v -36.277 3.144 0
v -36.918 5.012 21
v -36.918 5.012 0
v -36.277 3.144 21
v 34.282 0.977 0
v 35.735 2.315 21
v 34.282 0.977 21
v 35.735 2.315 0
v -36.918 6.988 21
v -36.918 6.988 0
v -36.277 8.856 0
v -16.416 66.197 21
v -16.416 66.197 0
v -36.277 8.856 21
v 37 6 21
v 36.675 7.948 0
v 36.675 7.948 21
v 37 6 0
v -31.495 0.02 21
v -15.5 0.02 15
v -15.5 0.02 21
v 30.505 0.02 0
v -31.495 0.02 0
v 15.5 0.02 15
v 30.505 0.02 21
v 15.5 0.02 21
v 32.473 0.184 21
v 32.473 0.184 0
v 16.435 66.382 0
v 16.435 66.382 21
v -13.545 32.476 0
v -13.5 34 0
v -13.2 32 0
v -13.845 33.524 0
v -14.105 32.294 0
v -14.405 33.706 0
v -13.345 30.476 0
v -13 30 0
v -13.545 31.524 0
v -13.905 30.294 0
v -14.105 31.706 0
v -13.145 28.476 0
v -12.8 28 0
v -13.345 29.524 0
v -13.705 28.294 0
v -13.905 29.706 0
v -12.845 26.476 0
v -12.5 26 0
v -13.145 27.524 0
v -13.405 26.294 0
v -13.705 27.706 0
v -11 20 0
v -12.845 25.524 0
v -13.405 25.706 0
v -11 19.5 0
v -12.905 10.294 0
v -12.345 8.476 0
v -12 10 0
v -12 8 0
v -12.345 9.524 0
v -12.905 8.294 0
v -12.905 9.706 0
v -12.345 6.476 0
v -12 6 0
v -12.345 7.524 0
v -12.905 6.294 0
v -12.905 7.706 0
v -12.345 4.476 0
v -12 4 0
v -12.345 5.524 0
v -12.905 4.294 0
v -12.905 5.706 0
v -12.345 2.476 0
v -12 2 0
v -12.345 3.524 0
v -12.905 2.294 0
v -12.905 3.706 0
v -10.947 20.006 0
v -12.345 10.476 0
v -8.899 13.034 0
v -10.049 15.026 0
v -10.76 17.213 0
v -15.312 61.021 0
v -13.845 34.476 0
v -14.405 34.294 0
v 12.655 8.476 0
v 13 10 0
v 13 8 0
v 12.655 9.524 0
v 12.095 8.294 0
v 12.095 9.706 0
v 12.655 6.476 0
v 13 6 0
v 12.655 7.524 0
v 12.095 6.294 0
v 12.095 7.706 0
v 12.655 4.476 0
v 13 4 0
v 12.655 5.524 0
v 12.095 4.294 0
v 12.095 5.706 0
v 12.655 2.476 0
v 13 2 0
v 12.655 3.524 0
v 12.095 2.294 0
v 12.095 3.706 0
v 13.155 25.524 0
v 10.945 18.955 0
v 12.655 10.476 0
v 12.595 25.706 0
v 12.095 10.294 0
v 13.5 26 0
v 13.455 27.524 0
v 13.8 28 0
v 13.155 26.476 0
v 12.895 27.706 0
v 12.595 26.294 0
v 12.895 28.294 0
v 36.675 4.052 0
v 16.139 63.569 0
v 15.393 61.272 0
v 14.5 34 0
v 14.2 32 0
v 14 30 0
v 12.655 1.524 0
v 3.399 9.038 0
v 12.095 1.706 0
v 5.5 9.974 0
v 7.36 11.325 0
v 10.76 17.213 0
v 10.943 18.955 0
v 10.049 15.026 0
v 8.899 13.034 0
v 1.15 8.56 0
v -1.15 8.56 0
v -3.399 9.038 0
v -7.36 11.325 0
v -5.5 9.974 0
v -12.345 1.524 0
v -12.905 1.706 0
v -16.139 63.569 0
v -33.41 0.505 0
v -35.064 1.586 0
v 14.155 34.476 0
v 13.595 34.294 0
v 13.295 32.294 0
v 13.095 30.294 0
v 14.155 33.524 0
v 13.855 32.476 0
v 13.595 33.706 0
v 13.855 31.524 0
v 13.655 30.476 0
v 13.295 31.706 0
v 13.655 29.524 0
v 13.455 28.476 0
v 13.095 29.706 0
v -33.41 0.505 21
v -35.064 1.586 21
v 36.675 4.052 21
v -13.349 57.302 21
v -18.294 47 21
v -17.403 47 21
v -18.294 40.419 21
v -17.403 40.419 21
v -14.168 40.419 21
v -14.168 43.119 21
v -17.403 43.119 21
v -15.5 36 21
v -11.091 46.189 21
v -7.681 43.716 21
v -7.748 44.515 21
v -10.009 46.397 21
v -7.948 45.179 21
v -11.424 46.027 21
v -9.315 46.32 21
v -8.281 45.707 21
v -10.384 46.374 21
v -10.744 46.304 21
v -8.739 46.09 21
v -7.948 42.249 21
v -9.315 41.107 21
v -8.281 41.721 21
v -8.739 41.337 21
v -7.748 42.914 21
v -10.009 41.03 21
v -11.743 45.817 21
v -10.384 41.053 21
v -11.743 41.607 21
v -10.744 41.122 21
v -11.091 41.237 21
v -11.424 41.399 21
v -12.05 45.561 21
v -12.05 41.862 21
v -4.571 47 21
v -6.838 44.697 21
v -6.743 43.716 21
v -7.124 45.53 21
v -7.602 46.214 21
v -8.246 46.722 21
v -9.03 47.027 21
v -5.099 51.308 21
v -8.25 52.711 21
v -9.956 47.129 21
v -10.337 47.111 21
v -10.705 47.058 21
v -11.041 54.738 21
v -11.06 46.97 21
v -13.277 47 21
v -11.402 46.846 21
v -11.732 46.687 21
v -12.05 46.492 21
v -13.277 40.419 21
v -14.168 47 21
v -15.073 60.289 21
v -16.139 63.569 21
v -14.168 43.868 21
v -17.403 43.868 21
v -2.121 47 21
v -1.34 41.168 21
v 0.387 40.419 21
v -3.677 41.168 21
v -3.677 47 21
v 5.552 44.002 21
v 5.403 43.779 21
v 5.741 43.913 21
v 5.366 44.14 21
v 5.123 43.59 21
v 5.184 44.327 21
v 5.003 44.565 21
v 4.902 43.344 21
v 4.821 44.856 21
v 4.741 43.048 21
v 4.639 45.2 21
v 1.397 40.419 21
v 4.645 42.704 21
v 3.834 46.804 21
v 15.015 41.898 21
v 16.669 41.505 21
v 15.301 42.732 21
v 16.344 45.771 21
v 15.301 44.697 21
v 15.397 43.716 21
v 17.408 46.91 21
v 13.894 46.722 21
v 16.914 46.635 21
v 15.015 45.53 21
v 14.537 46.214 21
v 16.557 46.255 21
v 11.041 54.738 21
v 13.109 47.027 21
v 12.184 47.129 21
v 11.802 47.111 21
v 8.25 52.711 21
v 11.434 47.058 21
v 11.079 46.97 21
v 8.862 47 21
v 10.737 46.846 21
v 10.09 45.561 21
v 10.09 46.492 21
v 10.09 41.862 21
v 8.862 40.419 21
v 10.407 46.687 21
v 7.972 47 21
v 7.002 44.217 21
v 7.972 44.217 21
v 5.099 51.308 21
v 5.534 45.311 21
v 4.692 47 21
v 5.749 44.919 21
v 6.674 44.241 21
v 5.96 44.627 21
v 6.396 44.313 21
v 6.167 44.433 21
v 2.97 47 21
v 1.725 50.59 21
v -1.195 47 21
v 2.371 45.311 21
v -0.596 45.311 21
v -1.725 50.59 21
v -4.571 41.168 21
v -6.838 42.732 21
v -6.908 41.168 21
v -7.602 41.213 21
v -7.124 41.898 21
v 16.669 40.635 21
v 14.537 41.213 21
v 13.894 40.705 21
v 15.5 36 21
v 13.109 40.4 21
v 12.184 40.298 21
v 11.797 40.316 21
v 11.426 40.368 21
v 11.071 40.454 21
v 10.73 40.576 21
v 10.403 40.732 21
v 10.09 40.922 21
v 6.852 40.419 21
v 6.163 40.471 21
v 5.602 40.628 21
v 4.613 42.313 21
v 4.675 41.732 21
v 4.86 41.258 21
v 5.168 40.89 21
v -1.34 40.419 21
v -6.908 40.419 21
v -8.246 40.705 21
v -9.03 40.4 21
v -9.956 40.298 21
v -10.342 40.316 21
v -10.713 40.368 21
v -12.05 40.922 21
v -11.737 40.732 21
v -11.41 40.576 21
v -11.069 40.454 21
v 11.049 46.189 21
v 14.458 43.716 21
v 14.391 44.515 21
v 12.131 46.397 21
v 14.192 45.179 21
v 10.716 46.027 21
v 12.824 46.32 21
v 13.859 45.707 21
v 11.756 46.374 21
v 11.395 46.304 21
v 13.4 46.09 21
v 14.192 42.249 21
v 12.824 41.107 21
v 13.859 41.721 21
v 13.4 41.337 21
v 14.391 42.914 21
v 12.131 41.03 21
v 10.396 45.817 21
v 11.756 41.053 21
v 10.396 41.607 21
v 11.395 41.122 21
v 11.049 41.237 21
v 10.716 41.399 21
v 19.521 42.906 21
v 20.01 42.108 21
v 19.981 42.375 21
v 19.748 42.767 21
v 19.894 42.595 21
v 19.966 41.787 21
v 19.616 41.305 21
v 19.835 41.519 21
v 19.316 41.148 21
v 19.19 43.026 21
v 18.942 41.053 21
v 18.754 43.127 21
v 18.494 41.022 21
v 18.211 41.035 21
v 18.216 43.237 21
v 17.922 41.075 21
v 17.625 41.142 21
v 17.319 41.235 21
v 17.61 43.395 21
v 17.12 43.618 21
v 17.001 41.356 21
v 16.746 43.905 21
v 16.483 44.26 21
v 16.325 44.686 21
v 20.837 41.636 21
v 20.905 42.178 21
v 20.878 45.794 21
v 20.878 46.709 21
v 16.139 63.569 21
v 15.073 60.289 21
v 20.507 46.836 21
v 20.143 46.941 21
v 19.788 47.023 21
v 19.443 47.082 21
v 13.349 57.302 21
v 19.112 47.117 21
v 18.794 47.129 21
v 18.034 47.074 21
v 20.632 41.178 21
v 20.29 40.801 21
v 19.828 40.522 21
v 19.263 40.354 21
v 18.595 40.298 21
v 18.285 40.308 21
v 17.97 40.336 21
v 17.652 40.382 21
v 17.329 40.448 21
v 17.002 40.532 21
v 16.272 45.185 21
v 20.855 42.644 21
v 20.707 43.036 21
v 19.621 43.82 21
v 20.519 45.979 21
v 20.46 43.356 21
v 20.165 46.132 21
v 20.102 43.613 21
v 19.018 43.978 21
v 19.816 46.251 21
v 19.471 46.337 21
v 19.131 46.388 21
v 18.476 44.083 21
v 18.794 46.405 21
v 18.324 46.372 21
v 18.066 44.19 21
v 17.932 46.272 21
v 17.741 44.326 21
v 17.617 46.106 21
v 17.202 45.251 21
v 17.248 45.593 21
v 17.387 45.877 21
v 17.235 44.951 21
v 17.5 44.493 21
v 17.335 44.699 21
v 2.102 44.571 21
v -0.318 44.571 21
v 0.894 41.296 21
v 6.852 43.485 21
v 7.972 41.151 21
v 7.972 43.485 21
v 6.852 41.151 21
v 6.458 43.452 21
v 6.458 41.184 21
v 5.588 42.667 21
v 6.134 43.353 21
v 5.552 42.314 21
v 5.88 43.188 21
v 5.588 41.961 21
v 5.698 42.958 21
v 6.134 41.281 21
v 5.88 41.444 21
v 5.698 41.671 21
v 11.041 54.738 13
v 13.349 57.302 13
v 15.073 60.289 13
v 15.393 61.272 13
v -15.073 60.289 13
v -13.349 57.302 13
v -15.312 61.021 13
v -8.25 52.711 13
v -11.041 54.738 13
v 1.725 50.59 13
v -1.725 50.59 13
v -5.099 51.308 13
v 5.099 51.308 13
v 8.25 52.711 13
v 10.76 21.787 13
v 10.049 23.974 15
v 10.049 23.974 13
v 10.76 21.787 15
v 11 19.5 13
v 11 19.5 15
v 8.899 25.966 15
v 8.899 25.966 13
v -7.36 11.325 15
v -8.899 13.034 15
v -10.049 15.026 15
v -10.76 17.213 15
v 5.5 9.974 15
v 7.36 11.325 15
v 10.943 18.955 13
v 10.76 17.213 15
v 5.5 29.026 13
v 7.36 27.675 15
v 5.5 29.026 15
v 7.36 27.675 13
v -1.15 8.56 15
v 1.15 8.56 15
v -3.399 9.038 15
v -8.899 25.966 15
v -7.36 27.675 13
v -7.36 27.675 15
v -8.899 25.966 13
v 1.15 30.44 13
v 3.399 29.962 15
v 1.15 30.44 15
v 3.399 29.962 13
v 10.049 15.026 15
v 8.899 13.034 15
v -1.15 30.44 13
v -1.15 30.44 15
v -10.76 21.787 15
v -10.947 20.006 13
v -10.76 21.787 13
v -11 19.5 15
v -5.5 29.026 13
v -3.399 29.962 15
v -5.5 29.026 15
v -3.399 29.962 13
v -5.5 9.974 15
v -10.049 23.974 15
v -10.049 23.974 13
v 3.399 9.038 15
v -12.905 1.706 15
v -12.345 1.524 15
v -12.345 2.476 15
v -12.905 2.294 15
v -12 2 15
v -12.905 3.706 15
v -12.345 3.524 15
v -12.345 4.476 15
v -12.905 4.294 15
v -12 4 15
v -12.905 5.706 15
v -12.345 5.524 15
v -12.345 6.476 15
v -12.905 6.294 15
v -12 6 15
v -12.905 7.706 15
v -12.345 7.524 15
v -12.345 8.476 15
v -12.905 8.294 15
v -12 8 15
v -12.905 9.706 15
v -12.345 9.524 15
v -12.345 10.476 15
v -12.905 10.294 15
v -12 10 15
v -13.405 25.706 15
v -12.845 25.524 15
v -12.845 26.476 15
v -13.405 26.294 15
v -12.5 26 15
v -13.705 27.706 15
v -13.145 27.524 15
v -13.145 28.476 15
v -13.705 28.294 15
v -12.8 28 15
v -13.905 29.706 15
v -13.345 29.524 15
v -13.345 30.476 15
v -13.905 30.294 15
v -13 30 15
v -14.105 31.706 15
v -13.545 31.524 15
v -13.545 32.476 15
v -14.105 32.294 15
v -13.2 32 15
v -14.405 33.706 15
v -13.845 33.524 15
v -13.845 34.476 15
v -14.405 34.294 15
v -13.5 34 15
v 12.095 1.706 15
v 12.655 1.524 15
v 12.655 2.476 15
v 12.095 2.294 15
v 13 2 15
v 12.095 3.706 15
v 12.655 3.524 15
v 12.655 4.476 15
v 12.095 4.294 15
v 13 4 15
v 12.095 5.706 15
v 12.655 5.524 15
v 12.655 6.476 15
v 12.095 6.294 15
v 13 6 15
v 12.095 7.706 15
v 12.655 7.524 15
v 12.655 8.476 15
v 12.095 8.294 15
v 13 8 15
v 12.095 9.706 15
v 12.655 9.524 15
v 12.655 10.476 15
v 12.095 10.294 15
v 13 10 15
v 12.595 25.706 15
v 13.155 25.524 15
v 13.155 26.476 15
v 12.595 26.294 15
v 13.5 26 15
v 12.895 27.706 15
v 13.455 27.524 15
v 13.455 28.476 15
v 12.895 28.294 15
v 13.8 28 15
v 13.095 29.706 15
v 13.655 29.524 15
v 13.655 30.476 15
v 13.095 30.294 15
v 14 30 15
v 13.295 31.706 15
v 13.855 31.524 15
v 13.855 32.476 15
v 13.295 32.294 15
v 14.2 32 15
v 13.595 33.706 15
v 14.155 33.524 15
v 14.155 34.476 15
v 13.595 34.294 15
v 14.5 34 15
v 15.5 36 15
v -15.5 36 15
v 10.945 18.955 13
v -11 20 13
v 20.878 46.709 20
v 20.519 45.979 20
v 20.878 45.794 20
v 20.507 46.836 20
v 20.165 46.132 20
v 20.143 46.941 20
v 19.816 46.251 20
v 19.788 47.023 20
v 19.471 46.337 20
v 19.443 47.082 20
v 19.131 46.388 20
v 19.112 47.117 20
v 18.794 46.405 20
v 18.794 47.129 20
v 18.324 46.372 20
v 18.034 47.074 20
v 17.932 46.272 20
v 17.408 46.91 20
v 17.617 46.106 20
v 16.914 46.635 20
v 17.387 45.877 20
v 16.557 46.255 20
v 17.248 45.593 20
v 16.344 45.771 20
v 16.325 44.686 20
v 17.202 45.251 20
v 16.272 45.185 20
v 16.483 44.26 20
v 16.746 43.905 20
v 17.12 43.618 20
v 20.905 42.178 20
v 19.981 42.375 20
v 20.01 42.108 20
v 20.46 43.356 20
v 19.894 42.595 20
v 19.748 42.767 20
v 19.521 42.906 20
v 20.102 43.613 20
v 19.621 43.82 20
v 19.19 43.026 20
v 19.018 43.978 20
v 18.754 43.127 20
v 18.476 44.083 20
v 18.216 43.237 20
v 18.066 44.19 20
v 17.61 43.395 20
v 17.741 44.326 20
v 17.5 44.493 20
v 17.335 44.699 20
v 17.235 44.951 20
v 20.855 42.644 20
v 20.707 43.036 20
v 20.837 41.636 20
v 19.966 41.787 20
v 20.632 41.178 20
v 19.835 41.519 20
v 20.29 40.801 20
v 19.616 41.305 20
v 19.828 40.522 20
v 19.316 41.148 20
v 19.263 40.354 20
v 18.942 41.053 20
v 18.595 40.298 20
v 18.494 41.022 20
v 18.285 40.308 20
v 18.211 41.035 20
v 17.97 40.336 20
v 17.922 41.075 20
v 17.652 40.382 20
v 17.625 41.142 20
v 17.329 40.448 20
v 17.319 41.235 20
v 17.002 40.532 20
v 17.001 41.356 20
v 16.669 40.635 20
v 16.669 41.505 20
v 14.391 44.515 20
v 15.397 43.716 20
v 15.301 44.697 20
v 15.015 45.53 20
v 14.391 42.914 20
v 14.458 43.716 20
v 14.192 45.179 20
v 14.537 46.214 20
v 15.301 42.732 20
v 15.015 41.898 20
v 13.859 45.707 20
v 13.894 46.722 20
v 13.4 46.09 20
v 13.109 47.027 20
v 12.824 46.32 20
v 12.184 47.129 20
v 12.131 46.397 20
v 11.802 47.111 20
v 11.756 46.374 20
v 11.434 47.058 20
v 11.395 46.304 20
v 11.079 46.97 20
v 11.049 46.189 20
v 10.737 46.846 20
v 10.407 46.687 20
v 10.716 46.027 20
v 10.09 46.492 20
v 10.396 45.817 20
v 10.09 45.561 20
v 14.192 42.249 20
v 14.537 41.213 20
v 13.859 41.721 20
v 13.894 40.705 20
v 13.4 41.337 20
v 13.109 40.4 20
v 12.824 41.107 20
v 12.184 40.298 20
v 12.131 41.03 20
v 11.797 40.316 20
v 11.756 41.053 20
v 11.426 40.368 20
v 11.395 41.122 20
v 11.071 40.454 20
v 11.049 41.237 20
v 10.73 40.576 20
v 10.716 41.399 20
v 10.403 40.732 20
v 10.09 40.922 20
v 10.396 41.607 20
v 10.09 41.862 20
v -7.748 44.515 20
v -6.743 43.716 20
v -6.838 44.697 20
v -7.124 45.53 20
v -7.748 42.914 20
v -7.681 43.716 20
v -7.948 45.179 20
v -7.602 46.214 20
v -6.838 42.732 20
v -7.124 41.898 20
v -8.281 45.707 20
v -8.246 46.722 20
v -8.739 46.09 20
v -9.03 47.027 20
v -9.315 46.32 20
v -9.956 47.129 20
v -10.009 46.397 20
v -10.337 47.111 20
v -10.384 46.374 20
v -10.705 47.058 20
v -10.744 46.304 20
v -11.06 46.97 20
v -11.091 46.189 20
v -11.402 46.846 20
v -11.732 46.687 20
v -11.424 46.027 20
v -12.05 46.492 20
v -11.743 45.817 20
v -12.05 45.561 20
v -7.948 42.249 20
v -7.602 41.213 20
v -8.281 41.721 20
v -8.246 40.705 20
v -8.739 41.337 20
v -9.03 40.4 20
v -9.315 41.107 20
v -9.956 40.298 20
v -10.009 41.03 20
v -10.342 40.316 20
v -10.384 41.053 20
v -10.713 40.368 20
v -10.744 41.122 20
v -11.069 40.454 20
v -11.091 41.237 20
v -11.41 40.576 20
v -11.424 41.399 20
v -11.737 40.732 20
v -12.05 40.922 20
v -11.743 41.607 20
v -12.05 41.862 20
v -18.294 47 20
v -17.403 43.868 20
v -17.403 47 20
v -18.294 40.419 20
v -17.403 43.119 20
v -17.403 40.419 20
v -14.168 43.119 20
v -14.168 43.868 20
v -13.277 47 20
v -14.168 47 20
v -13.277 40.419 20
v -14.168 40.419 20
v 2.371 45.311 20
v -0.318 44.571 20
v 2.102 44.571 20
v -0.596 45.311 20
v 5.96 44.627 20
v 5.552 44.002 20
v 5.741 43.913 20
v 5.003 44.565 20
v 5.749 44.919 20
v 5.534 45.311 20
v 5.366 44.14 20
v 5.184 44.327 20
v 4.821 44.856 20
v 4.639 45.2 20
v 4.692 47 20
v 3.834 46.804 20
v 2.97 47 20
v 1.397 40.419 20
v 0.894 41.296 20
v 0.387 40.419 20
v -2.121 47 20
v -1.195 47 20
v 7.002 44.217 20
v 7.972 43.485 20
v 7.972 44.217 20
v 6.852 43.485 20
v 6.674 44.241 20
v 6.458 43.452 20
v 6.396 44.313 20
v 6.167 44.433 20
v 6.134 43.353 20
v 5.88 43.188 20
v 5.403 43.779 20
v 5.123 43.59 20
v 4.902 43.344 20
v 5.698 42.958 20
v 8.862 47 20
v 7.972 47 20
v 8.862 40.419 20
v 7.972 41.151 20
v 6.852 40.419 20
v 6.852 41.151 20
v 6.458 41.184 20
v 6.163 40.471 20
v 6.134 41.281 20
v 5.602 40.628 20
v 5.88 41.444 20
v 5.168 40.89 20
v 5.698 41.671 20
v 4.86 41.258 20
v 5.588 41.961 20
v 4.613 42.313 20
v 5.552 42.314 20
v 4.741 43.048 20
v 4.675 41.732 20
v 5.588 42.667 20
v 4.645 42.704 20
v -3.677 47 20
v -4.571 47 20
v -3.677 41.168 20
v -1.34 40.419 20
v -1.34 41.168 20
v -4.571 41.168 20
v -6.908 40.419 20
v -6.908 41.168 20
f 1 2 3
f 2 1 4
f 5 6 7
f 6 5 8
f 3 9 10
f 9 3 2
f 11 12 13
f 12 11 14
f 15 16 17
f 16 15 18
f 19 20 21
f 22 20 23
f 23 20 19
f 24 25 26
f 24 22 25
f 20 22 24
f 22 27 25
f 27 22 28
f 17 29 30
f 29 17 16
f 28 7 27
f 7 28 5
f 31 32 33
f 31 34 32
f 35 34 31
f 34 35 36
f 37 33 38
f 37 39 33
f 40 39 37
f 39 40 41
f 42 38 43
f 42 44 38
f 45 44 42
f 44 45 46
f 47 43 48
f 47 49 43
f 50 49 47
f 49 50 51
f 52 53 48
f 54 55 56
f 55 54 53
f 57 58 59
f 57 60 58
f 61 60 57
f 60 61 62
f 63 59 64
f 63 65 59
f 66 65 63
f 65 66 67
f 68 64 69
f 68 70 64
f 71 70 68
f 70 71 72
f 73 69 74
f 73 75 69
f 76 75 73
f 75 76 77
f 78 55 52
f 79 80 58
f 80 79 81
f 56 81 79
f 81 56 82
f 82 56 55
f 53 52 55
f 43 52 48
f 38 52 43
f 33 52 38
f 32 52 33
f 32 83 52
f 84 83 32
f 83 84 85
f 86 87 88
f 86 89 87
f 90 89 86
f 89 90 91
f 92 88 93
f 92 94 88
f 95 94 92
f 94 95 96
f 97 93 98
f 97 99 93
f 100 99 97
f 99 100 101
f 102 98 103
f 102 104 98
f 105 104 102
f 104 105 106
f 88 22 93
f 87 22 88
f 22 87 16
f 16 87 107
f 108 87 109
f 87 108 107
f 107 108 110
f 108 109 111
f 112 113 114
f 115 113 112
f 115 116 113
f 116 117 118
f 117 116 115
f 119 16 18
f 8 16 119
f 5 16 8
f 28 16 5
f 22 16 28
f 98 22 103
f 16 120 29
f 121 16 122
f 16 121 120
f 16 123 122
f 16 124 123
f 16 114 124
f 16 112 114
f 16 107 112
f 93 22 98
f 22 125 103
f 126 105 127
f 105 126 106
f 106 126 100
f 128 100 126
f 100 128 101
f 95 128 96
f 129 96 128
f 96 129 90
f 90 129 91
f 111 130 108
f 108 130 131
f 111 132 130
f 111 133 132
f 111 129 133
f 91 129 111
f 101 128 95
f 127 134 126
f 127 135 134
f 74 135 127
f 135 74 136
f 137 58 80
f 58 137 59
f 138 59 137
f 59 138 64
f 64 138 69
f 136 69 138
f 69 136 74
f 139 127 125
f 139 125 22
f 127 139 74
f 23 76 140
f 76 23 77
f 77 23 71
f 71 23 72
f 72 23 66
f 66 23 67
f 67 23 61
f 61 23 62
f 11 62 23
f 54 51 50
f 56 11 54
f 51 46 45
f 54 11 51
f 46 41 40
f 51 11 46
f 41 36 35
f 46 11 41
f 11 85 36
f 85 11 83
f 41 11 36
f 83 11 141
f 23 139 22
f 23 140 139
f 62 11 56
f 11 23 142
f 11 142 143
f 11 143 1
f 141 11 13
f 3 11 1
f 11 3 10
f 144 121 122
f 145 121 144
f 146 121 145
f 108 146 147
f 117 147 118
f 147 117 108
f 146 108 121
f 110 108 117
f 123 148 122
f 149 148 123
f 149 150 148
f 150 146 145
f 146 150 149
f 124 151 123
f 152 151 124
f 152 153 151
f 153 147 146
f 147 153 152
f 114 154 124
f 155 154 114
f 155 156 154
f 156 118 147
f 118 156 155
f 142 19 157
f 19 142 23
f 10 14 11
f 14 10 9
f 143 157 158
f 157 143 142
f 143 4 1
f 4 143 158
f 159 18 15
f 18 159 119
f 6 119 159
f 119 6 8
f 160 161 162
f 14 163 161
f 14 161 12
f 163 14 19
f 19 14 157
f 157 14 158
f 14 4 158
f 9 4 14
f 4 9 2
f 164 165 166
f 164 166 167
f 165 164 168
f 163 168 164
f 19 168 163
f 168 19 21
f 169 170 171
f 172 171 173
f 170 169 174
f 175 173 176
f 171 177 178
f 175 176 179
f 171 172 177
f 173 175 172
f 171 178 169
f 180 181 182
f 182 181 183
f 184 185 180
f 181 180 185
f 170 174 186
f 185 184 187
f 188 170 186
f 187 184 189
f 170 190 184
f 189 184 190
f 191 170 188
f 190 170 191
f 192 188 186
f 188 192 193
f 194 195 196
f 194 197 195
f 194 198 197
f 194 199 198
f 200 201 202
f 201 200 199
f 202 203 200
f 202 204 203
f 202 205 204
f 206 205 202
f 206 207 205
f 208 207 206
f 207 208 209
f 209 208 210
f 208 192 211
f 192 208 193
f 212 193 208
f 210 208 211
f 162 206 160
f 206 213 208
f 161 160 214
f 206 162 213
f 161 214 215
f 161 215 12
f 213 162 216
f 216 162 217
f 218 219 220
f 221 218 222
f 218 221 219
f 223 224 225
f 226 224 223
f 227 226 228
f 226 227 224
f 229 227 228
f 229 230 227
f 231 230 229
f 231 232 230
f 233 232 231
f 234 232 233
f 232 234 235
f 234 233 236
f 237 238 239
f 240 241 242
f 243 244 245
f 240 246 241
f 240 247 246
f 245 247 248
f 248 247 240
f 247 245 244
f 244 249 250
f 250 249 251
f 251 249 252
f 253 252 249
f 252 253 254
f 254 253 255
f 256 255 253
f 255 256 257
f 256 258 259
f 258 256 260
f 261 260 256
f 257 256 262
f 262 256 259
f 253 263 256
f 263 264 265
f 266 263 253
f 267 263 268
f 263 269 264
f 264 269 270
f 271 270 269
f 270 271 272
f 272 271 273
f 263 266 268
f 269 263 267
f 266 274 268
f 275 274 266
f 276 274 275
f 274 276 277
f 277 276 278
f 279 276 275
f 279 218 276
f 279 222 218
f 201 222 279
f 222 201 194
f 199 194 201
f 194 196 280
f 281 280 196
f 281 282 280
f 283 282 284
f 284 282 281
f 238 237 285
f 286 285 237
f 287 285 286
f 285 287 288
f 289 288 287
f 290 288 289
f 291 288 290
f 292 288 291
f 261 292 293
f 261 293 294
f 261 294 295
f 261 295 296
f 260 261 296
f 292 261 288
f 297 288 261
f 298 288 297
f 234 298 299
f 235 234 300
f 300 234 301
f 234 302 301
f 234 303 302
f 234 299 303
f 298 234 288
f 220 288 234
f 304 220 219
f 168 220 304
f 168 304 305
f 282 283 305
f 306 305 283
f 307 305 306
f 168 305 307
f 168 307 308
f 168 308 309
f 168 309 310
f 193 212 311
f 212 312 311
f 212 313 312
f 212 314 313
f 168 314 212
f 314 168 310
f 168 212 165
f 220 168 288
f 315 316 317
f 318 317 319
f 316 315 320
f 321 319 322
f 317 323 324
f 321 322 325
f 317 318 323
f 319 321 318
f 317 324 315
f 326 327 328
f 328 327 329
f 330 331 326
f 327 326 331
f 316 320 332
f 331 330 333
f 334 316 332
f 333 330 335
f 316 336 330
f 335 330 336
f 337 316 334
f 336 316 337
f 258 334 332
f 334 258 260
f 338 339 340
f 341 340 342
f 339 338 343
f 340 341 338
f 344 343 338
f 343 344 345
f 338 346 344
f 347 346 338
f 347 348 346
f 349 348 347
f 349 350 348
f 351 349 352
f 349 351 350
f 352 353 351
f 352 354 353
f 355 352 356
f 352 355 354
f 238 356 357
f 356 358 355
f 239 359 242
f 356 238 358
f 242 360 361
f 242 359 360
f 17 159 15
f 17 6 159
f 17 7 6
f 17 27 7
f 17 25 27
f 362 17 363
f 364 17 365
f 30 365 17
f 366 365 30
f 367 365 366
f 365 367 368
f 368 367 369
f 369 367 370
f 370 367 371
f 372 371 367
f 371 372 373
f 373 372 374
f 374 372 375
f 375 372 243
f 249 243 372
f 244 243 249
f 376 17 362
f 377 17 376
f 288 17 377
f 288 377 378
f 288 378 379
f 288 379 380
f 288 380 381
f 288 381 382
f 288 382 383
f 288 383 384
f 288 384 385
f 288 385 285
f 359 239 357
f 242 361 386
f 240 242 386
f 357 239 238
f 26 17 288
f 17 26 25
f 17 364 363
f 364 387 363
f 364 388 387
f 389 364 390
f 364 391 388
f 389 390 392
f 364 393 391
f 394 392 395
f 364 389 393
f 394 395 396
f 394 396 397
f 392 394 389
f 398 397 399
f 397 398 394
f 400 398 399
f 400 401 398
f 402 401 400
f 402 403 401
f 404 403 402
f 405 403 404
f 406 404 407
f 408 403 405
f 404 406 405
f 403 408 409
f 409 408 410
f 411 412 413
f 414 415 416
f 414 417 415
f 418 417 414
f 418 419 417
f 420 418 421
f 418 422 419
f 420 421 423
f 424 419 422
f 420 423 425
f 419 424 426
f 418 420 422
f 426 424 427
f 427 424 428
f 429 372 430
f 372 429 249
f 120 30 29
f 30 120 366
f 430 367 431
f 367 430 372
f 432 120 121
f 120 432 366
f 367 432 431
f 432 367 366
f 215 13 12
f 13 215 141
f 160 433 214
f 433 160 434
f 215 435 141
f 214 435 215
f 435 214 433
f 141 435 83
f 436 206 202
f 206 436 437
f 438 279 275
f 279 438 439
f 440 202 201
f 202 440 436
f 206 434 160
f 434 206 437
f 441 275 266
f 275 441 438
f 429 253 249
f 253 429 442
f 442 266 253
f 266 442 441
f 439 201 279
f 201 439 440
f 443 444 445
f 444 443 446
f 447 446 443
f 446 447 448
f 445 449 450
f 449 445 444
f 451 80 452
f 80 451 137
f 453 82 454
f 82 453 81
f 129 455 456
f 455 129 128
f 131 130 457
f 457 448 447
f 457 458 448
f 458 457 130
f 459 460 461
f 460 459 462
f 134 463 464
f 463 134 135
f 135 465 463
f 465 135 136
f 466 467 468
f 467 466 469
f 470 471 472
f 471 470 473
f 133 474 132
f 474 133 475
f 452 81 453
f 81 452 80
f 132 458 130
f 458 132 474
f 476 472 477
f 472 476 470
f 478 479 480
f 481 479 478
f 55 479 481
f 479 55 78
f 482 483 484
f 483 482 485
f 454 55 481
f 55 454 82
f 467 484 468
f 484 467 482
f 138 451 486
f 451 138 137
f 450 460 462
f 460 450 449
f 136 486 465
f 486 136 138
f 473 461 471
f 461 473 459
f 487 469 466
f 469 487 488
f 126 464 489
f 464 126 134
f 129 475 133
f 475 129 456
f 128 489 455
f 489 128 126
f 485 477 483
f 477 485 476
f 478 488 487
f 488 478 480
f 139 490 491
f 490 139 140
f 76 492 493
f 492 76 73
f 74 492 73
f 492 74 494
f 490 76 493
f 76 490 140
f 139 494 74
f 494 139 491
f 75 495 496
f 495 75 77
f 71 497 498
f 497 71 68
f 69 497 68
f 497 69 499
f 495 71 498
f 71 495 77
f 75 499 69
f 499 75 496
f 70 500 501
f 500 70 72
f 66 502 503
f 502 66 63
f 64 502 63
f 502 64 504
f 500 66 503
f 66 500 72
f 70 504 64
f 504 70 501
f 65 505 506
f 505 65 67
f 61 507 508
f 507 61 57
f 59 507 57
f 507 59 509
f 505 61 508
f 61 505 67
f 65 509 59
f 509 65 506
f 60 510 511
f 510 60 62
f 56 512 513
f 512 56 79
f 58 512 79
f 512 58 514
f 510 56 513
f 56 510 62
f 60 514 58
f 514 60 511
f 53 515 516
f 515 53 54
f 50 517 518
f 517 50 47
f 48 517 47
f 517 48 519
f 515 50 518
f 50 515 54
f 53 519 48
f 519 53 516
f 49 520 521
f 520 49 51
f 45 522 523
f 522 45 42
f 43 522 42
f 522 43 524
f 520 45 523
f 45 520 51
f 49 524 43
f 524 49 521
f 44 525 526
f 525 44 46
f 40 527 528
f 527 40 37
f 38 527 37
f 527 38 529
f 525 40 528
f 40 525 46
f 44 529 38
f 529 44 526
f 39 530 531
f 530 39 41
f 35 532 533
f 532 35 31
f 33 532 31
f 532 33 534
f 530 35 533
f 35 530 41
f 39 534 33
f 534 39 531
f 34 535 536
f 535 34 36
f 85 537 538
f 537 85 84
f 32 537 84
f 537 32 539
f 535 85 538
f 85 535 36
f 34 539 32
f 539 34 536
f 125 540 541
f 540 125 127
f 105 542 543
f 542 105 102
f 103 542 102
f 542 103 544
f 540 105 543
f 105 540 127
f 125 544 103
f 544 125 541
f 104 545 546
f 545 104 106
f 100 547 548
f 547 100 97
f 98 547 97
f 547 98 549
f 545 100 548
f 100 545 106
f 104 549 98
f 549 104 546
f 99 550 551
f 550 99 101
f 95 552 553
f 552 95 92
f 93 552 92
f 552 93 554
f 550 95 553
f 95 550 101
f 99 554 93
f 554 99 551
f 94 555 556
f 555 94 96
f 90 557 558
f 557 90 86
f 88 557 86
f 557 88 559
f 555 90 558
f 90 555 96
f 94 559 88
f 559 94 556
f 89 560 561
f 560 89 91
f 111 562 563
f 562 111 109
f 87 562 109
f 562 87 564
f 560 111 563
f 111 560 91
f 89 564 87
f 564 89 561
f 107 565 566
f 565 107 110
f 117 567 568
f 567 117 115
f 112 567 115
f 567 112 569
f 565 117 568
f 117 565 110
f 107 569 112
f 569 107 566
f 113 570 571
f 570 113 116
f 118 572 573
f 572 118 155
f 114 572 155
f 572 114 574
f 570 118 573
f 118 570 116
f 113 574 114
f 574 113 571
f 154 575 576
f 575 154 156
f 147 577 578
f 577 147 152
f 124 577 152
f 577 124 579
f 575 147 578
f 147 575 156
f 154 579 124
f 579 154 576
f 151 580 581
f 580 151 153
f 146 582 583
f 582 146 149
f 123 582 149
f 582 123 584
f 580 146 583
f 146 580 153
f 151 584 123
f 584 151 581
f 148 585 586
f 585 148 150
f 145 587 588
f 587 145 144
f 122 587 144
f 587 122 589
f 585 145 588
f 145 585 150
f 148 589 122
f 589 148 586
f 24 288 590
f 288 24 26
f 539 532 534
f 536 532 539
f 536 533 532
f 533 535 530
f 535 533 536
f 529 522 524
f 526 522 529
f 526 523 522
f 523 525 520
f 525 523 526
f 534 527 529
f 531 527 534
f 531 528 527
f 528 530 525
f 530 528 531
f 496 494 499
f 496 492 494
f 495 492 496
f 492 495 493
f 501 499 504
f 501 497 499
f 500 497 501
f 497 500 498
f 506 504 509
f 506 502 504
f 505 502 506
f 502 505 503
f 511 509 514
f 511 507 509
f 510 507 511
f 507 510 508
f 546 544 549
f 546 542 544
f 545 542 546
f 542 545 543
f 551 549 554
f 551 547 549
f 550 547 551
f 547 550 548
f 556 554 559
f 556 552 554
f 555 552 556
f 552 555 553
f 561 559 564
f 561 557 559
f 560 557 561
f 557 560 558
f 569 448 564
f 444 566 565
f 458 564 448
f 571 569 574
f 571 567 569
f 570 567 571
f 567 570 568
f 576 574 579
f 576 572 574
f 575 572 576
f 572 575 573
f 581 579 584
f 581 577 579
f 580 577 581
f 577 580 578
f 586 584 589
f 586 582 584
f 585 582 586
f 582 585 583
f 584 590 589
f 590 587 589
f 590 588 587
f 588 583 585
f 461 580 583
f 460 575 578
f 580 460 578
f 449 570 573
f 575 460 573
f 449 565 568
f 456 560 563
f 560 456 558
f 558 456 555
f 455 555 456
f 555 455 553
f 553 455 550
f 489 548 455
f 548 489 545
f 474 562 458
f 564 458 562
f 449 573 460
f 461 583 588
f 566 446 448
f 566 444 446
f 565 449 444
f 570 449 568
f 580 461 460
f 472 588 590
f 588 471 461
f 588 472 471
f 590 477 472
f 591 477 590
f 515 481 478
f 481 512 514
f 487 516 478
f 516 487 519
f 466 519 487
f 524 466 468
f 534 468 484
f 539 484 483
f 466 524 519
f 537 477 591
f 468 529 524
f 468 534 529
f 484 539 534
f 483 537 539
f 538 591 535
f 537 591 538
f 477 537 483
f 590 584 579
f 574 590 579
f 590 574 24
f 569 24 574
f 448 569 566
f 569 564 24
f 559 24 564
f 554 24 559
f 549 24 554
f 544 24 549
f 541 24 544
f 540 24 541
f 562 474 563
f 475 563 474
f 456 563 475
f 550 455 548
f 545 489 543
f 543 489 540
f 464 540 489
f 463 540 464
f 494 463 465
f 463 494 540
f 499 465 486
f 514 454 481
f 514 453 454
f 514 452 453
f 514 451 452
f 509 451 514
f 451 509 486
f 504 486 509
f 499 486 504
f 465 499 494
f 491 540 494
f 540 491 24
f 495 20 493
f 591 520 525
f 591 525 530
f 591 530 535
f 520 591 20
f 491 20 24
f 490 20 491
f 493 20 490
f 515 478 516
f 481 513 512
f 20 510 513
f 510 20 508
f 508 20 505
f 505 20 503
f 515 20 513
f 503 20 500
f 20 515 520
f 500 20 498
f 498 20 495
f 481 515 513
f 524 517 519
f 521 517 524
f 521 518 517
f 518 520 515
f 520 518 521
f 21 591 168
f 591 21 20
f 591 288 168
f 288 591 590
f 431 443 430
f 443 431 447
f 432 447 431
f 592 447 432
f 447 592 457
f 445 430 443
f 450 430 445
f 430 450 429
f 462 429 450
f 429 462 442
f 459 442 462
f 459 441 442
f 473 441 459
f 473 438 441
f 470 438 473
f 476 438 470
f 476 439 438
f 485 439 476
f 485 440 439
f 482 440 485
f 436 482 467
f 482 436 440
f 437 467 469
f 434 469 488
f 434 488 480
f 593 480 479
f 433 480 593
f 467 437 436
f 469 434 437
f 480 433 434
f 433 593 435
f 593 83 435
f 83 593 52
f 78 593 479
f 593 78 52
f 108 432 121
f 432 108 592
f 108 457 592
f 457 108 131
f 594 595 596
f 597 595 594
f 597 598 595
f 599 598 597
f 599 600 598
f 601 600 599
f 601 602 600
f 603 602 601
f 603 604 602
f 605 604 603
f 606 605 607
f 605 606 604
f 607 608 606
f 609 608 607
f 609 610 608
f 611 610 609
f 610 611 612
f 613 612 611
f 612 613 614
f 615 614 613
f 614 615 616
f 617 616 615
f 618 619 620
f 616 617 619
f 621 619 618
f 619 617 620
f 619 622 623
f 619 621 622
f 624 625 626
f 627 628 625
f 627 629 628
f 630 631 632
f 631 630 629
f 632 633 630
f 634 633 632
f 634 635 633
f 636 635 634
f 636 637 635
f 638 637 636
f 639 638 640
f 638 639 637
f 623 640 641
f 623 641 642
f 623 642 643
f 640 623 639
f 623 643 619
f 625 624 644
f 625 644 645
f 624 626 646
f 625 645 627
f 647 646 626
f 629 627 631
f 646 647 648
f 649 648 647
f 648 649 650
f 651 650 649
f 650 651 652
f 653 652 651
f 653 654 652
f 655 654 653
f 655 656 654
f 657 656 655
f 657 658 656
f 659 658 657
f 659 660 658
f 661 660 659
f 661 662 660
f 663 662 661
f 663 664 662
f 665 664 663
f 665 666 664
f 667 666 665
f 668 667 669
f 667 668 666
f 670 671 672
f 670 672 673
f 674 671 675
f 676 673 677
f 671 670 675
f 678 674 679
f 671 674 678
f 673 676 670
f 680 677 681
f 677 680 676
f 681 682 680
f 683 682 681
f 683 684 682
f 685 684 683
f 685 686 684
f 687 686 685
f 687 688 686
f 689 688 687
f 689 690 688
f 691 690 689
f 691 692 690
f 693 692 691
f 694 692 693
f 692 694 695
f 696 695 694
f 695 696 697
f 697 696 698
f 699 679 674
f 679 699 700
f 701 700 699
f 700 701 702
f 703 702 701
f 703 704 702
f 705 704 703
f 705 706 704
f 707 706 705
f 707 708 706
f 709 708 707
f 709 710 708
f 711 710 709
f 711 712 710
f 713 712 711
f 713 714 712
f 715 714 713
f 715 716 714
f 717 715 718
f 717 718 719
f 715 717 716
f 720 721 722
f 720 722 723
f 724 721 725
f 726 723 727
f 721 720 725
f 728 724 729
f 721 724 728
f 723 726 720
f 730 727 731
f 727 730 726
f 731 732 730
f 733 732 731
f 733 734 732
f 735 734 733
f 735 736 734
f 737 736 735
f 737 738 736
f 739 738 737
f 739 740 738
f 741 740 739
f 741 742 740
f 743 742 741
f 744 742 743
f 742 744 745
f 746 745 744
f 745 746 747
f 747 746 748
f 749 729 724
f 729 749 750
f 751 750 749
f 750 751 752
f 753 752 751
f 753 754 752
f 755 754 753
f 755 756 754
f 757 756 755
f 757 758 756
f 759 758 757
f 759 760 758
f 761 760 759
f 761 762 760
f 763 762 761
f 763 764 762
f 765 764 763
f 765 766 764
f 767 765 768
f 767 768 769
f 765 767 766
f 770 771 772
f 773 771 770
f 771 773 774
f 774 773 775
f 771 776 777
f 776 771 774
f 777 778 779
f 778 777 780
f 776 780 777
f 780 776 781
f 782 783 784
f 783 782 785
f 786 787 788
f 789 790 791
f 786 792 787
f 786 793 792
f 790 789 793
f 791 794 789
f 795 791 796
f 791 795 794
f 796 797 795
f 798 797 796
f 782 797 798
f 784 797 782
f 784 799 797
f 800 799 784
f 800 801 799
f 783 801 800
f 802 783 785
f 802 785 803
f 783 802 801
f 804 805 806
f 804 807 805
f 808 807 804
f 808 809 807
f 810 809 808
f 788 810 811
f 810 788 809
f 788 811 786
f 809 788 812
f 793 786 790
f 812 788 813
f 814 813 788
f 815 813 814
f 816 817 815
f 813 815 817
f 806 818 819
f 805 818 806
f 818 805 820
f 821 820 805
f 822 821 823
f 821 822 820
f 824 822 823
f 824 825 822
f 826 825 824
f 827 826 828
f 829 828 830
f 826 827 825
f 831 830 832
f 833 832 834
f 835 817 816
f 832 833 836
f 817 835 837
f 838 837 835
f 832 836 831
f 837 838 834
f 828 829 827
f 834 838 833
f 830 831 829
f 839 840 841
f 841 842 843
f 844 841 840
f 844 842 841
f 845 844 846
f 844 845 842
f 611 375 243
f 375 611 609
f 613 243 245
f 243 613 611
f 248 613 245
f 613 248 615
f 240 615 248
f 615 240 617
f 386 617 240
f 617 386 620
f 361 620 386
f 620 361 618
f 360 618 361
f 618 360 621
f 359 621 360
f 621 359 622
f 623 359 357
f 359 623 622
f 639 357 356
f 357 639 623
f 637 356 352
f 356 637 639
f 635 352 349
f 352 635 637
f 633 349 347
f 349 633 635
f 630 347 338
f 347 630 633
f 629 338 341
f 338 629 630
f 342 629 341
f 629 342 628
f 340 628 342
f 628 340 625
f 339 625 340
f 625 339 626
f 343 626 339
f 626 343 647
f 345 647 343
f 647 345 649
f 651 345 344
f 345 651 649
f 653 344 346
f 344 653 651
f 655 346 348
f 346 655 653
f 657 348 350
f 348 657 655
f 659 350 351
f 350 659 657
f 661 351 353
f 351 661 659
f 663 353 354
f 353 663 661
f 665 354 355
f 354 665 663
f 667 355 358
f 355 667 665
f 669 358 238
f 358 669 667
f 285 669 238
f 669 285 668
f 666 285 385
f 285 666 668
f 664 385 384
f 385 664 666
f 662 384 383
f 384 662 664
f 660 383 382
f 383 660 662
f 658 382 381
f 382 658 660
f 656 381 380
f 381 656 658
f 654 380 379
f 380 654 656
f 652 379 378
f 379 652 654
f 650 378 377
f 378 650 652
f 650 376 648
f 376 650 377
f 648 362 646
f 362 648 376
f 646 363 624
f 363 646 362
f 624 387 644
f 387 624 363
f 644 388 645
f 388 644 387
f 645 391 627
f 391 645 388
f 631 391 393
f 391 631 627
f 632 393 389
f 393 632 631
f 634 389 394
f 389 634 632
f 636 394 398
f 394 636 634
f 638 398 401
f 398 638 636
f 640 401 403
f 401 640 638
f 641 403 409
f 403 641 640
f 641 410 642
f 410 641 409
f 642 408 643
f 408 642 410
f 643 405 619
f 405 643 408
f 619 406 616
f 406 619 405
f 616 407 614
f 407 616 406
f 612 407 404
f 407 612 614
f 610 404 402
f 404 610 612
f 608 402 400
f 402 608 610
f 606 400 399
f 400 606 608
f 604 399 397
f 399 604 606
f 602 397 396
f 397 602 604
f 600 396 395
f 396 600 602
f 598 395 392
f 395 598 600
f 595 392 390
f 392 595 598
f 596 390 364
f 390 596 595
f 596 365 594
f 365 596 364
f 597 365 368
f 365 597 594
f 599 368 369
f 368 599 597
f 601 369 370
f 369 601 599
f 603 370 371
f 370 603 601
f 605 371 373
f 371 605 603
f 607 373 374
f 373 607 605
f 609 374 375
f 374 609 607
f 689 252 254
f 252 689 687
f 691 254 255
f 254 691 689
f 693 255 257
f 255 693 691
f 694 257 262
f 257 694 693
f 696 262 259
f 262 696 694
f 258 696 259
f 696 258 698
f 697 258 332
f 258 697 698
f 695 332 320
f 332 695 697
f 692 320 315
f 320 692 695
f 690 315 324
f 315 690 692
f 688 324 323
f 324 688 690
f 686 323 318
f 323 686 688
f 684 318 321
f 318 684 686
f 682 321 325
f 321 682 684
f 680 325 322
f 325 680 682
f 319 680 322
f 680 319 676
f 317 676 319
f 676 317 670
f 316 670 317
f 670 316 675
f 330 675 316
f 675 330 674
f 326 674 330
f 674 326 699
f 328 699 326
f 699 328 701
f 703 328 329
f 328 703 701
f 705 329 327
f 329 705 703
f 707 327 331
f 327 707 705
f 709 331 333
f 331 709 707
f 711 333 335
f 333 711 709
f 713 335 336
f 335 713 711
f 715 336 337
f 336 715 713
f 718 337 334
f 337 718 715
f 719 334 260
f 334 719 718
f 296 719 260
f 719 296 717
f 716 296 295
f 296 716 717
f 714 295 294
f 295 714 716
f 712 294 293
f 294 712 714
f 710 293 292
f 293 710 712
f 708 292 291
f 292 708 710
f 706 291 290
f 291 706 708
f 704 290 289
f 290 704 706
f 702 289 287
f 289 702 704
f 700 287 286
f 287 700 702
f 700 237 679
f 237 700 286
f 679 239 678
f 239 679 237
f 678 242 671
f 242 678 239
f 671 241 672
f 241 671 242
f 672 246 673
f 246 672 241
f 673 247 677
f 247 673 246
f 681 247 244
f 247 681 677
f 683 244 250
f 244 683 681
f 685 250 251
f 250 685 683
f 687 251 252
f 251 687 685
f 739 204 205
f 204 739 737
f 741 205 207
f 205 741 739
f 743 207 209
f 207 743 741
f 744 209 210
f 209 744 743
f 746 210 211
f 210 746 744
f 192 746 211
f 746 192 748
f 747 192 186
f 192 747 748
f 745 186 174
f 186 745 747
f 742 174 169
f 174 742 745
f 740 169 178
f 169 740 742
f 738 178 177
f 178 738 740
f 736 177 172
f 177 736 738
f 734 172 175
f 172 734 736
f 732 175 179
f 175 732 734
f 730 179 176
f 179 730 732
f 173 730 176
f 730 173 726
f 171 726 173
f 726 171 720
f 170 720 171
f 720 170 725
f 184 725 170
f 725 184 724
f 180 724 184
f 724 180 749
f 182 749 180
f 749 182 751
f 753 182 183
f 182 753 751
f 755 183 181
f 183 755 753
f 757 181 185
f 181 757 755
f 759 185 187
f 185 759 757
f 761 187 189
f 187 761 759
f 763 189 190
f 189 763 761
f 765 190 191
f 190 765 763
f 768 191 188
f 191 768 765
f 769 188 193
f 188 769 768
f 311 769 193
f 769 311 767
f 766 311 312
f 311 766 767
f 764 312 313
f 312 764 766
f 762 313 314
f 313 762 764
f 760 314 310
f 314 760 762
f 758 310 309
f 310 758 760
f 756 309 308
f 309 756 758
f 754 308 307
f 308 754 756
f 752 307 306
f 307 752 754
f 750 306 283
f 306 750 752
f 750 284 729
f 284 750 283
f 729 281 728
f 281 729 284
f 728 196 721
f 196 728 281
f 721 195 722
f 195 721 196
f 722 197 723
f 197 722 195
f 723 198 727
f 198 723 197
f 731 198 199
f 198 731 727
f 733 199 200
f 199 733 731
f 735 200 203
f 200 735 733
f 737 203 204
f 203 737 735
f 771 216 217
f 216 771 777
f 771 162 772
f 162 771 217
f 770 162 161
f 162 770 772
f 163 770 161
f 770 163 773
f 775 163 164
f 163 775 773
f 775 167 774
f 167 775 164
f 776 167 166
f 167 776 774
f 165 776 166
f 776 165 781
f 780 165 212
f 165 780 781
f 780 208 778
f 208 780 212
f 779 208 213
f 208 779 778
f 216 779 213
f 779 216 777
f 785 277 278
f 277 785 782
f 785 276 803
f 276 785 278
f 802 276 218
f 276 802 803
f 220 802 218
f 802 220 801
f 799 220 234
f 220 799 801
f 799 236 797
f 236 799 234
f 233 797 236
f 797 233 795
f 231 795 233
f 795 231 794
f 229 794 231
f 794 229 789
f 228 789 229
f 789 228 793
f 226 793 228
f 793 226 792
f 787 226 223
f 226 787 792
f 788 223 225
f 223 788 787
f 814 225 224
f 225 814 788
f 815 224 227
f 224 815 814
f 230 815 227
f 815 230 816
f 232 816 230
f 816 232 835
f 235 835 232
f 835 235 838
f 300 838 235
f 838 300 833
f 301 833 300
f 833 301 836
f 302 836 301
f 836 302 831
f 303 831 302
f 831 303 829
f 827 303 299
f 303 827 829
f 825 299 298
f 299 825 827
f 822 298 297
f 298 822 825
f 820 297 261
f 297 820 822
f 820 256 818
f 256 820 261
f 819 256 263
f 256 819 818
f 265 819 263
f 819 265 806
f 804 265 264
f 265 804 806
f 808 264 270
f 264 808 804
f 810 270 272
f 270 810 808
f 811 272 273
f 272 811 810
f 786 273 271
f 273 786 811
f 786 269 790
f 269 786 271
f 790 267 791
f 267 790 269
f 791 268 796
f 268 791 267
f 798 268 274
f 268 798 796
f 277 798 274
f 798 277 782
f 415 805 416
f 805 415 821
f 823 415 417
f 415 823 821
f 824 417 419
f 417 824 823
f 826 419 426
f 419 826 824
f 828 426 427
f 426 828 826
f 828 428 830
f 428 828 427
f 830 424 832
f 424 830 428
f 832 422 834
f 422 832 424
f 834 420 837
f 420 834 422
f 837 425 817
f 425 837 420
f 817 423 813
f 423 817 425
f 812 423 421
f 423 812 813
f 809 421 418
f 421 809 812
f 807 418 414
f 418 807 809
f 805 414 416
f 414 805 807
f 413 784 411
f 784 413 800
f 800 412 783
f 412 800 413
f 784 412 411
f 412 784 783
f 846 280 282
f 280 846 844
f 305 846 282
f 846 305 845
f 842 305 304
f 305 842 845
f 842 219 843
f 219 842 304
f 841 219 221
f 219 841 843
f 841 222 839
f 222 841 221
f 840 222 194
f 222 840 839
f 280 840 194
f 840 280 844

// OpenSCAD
difference()
{
    union()
    {
        translate([0, 68, 0])
            cylinder(r=15, h = 21);
        color( "Red", 1 )
        difference()
        {
            minkowski()
            {
                translate([-31, 6, 10])
                    linear_extrude(height = 20, center = true, convexity =                  10,twist = 0)
                        polygon(points=[[0,0],[62,0],[31,89.5]], paths=[[0                      ,1,2]],convexity=10);
                cylinder(r=6);
            }
            translate([-45,74,-5]) cube([90,50,30]);
        }
    }
    
    //weapon axis hole
    translate([0, 67, 0]) cylinder(r=16.5, h = 21);
    
    //motor hole
    translate([0, 19.5, 0]) cylinder(r=11, h = 21);
    
    translate([-12.5, 2, 0]) cylinder(r=0.5, h = 21);
    translate([-12.5, 4, 0]) cylinder(r=0.5, h = 21);
    translate([-12.5, 6, 0]) cylinder(r=0.5, h = 21);
    translate([-12.5, 8, 0]) cylinder(r=0.5, h = 21);
    translate([-12.5, 10, 0]) cylinder(r=0.5, h = 21);
    
    translate([-13.0, 26, 0]) cylinder(r=0.5, h = 21);
    translate([-13.3, 28, 0]) cylinder(r=0.5, h = 21);
    translate([-13.5, 30, 0]) cylinder(r=0.5, h = 21);
    translate([-13.7, 32, 0]) cylinder(r=0.5, h = 21);
    translate([-14.0, 34, 0]) cylinder(r=0.5, h = 21);
    
    translate([12.5, 2, 0]) cylinder(r=0.5, h = 21);
    translate([12.5, 4, 0]) cylinder(r=0.5, h = 21);
    translate([12.5, 6, 0]) cylinder(r=0.5, h = 21);
    translate([12.5, 8, 0]) cylinder(r=0.5, h = 21);
    translate([12.5, 10, 0]) cylinder(r=0.5, h = 21);
    
    translate([13.0, 26, 0]) cylinder(r=0.5, h = 21);
    translate([13.3, 28, 0]) cylinder(r=0.5, h = 21);
    translate([13.5, 30, 0]) cylinder(r=0.5, h = 21);
    translate([13.7, 32, 0]) cylinder(r=0.5, h = 21);
    translate([14.0, 34, 0]) cylinder(r=0.5, h = 21);
    
    translate([-15.5,0,15]) cube([31,36,20]);
    
    
    //belt space
    translate([-11,20,-9]) rotate([0,0,6]) cube([10,45,22]);
    translate([1,20,-9]) rotate([0,0,-6]) cube([10,45,22]);
    translate([-5,20,-9]) cube([10,45,22]);
    
    translate([21.5,47,20]) rotate([0,0,180])
    linear_extrude(height = 2)
    text(text = "SCRATCH", font = "Arial Rounded MT Bold:style=Regular", size = 6.5);
    
    
}
